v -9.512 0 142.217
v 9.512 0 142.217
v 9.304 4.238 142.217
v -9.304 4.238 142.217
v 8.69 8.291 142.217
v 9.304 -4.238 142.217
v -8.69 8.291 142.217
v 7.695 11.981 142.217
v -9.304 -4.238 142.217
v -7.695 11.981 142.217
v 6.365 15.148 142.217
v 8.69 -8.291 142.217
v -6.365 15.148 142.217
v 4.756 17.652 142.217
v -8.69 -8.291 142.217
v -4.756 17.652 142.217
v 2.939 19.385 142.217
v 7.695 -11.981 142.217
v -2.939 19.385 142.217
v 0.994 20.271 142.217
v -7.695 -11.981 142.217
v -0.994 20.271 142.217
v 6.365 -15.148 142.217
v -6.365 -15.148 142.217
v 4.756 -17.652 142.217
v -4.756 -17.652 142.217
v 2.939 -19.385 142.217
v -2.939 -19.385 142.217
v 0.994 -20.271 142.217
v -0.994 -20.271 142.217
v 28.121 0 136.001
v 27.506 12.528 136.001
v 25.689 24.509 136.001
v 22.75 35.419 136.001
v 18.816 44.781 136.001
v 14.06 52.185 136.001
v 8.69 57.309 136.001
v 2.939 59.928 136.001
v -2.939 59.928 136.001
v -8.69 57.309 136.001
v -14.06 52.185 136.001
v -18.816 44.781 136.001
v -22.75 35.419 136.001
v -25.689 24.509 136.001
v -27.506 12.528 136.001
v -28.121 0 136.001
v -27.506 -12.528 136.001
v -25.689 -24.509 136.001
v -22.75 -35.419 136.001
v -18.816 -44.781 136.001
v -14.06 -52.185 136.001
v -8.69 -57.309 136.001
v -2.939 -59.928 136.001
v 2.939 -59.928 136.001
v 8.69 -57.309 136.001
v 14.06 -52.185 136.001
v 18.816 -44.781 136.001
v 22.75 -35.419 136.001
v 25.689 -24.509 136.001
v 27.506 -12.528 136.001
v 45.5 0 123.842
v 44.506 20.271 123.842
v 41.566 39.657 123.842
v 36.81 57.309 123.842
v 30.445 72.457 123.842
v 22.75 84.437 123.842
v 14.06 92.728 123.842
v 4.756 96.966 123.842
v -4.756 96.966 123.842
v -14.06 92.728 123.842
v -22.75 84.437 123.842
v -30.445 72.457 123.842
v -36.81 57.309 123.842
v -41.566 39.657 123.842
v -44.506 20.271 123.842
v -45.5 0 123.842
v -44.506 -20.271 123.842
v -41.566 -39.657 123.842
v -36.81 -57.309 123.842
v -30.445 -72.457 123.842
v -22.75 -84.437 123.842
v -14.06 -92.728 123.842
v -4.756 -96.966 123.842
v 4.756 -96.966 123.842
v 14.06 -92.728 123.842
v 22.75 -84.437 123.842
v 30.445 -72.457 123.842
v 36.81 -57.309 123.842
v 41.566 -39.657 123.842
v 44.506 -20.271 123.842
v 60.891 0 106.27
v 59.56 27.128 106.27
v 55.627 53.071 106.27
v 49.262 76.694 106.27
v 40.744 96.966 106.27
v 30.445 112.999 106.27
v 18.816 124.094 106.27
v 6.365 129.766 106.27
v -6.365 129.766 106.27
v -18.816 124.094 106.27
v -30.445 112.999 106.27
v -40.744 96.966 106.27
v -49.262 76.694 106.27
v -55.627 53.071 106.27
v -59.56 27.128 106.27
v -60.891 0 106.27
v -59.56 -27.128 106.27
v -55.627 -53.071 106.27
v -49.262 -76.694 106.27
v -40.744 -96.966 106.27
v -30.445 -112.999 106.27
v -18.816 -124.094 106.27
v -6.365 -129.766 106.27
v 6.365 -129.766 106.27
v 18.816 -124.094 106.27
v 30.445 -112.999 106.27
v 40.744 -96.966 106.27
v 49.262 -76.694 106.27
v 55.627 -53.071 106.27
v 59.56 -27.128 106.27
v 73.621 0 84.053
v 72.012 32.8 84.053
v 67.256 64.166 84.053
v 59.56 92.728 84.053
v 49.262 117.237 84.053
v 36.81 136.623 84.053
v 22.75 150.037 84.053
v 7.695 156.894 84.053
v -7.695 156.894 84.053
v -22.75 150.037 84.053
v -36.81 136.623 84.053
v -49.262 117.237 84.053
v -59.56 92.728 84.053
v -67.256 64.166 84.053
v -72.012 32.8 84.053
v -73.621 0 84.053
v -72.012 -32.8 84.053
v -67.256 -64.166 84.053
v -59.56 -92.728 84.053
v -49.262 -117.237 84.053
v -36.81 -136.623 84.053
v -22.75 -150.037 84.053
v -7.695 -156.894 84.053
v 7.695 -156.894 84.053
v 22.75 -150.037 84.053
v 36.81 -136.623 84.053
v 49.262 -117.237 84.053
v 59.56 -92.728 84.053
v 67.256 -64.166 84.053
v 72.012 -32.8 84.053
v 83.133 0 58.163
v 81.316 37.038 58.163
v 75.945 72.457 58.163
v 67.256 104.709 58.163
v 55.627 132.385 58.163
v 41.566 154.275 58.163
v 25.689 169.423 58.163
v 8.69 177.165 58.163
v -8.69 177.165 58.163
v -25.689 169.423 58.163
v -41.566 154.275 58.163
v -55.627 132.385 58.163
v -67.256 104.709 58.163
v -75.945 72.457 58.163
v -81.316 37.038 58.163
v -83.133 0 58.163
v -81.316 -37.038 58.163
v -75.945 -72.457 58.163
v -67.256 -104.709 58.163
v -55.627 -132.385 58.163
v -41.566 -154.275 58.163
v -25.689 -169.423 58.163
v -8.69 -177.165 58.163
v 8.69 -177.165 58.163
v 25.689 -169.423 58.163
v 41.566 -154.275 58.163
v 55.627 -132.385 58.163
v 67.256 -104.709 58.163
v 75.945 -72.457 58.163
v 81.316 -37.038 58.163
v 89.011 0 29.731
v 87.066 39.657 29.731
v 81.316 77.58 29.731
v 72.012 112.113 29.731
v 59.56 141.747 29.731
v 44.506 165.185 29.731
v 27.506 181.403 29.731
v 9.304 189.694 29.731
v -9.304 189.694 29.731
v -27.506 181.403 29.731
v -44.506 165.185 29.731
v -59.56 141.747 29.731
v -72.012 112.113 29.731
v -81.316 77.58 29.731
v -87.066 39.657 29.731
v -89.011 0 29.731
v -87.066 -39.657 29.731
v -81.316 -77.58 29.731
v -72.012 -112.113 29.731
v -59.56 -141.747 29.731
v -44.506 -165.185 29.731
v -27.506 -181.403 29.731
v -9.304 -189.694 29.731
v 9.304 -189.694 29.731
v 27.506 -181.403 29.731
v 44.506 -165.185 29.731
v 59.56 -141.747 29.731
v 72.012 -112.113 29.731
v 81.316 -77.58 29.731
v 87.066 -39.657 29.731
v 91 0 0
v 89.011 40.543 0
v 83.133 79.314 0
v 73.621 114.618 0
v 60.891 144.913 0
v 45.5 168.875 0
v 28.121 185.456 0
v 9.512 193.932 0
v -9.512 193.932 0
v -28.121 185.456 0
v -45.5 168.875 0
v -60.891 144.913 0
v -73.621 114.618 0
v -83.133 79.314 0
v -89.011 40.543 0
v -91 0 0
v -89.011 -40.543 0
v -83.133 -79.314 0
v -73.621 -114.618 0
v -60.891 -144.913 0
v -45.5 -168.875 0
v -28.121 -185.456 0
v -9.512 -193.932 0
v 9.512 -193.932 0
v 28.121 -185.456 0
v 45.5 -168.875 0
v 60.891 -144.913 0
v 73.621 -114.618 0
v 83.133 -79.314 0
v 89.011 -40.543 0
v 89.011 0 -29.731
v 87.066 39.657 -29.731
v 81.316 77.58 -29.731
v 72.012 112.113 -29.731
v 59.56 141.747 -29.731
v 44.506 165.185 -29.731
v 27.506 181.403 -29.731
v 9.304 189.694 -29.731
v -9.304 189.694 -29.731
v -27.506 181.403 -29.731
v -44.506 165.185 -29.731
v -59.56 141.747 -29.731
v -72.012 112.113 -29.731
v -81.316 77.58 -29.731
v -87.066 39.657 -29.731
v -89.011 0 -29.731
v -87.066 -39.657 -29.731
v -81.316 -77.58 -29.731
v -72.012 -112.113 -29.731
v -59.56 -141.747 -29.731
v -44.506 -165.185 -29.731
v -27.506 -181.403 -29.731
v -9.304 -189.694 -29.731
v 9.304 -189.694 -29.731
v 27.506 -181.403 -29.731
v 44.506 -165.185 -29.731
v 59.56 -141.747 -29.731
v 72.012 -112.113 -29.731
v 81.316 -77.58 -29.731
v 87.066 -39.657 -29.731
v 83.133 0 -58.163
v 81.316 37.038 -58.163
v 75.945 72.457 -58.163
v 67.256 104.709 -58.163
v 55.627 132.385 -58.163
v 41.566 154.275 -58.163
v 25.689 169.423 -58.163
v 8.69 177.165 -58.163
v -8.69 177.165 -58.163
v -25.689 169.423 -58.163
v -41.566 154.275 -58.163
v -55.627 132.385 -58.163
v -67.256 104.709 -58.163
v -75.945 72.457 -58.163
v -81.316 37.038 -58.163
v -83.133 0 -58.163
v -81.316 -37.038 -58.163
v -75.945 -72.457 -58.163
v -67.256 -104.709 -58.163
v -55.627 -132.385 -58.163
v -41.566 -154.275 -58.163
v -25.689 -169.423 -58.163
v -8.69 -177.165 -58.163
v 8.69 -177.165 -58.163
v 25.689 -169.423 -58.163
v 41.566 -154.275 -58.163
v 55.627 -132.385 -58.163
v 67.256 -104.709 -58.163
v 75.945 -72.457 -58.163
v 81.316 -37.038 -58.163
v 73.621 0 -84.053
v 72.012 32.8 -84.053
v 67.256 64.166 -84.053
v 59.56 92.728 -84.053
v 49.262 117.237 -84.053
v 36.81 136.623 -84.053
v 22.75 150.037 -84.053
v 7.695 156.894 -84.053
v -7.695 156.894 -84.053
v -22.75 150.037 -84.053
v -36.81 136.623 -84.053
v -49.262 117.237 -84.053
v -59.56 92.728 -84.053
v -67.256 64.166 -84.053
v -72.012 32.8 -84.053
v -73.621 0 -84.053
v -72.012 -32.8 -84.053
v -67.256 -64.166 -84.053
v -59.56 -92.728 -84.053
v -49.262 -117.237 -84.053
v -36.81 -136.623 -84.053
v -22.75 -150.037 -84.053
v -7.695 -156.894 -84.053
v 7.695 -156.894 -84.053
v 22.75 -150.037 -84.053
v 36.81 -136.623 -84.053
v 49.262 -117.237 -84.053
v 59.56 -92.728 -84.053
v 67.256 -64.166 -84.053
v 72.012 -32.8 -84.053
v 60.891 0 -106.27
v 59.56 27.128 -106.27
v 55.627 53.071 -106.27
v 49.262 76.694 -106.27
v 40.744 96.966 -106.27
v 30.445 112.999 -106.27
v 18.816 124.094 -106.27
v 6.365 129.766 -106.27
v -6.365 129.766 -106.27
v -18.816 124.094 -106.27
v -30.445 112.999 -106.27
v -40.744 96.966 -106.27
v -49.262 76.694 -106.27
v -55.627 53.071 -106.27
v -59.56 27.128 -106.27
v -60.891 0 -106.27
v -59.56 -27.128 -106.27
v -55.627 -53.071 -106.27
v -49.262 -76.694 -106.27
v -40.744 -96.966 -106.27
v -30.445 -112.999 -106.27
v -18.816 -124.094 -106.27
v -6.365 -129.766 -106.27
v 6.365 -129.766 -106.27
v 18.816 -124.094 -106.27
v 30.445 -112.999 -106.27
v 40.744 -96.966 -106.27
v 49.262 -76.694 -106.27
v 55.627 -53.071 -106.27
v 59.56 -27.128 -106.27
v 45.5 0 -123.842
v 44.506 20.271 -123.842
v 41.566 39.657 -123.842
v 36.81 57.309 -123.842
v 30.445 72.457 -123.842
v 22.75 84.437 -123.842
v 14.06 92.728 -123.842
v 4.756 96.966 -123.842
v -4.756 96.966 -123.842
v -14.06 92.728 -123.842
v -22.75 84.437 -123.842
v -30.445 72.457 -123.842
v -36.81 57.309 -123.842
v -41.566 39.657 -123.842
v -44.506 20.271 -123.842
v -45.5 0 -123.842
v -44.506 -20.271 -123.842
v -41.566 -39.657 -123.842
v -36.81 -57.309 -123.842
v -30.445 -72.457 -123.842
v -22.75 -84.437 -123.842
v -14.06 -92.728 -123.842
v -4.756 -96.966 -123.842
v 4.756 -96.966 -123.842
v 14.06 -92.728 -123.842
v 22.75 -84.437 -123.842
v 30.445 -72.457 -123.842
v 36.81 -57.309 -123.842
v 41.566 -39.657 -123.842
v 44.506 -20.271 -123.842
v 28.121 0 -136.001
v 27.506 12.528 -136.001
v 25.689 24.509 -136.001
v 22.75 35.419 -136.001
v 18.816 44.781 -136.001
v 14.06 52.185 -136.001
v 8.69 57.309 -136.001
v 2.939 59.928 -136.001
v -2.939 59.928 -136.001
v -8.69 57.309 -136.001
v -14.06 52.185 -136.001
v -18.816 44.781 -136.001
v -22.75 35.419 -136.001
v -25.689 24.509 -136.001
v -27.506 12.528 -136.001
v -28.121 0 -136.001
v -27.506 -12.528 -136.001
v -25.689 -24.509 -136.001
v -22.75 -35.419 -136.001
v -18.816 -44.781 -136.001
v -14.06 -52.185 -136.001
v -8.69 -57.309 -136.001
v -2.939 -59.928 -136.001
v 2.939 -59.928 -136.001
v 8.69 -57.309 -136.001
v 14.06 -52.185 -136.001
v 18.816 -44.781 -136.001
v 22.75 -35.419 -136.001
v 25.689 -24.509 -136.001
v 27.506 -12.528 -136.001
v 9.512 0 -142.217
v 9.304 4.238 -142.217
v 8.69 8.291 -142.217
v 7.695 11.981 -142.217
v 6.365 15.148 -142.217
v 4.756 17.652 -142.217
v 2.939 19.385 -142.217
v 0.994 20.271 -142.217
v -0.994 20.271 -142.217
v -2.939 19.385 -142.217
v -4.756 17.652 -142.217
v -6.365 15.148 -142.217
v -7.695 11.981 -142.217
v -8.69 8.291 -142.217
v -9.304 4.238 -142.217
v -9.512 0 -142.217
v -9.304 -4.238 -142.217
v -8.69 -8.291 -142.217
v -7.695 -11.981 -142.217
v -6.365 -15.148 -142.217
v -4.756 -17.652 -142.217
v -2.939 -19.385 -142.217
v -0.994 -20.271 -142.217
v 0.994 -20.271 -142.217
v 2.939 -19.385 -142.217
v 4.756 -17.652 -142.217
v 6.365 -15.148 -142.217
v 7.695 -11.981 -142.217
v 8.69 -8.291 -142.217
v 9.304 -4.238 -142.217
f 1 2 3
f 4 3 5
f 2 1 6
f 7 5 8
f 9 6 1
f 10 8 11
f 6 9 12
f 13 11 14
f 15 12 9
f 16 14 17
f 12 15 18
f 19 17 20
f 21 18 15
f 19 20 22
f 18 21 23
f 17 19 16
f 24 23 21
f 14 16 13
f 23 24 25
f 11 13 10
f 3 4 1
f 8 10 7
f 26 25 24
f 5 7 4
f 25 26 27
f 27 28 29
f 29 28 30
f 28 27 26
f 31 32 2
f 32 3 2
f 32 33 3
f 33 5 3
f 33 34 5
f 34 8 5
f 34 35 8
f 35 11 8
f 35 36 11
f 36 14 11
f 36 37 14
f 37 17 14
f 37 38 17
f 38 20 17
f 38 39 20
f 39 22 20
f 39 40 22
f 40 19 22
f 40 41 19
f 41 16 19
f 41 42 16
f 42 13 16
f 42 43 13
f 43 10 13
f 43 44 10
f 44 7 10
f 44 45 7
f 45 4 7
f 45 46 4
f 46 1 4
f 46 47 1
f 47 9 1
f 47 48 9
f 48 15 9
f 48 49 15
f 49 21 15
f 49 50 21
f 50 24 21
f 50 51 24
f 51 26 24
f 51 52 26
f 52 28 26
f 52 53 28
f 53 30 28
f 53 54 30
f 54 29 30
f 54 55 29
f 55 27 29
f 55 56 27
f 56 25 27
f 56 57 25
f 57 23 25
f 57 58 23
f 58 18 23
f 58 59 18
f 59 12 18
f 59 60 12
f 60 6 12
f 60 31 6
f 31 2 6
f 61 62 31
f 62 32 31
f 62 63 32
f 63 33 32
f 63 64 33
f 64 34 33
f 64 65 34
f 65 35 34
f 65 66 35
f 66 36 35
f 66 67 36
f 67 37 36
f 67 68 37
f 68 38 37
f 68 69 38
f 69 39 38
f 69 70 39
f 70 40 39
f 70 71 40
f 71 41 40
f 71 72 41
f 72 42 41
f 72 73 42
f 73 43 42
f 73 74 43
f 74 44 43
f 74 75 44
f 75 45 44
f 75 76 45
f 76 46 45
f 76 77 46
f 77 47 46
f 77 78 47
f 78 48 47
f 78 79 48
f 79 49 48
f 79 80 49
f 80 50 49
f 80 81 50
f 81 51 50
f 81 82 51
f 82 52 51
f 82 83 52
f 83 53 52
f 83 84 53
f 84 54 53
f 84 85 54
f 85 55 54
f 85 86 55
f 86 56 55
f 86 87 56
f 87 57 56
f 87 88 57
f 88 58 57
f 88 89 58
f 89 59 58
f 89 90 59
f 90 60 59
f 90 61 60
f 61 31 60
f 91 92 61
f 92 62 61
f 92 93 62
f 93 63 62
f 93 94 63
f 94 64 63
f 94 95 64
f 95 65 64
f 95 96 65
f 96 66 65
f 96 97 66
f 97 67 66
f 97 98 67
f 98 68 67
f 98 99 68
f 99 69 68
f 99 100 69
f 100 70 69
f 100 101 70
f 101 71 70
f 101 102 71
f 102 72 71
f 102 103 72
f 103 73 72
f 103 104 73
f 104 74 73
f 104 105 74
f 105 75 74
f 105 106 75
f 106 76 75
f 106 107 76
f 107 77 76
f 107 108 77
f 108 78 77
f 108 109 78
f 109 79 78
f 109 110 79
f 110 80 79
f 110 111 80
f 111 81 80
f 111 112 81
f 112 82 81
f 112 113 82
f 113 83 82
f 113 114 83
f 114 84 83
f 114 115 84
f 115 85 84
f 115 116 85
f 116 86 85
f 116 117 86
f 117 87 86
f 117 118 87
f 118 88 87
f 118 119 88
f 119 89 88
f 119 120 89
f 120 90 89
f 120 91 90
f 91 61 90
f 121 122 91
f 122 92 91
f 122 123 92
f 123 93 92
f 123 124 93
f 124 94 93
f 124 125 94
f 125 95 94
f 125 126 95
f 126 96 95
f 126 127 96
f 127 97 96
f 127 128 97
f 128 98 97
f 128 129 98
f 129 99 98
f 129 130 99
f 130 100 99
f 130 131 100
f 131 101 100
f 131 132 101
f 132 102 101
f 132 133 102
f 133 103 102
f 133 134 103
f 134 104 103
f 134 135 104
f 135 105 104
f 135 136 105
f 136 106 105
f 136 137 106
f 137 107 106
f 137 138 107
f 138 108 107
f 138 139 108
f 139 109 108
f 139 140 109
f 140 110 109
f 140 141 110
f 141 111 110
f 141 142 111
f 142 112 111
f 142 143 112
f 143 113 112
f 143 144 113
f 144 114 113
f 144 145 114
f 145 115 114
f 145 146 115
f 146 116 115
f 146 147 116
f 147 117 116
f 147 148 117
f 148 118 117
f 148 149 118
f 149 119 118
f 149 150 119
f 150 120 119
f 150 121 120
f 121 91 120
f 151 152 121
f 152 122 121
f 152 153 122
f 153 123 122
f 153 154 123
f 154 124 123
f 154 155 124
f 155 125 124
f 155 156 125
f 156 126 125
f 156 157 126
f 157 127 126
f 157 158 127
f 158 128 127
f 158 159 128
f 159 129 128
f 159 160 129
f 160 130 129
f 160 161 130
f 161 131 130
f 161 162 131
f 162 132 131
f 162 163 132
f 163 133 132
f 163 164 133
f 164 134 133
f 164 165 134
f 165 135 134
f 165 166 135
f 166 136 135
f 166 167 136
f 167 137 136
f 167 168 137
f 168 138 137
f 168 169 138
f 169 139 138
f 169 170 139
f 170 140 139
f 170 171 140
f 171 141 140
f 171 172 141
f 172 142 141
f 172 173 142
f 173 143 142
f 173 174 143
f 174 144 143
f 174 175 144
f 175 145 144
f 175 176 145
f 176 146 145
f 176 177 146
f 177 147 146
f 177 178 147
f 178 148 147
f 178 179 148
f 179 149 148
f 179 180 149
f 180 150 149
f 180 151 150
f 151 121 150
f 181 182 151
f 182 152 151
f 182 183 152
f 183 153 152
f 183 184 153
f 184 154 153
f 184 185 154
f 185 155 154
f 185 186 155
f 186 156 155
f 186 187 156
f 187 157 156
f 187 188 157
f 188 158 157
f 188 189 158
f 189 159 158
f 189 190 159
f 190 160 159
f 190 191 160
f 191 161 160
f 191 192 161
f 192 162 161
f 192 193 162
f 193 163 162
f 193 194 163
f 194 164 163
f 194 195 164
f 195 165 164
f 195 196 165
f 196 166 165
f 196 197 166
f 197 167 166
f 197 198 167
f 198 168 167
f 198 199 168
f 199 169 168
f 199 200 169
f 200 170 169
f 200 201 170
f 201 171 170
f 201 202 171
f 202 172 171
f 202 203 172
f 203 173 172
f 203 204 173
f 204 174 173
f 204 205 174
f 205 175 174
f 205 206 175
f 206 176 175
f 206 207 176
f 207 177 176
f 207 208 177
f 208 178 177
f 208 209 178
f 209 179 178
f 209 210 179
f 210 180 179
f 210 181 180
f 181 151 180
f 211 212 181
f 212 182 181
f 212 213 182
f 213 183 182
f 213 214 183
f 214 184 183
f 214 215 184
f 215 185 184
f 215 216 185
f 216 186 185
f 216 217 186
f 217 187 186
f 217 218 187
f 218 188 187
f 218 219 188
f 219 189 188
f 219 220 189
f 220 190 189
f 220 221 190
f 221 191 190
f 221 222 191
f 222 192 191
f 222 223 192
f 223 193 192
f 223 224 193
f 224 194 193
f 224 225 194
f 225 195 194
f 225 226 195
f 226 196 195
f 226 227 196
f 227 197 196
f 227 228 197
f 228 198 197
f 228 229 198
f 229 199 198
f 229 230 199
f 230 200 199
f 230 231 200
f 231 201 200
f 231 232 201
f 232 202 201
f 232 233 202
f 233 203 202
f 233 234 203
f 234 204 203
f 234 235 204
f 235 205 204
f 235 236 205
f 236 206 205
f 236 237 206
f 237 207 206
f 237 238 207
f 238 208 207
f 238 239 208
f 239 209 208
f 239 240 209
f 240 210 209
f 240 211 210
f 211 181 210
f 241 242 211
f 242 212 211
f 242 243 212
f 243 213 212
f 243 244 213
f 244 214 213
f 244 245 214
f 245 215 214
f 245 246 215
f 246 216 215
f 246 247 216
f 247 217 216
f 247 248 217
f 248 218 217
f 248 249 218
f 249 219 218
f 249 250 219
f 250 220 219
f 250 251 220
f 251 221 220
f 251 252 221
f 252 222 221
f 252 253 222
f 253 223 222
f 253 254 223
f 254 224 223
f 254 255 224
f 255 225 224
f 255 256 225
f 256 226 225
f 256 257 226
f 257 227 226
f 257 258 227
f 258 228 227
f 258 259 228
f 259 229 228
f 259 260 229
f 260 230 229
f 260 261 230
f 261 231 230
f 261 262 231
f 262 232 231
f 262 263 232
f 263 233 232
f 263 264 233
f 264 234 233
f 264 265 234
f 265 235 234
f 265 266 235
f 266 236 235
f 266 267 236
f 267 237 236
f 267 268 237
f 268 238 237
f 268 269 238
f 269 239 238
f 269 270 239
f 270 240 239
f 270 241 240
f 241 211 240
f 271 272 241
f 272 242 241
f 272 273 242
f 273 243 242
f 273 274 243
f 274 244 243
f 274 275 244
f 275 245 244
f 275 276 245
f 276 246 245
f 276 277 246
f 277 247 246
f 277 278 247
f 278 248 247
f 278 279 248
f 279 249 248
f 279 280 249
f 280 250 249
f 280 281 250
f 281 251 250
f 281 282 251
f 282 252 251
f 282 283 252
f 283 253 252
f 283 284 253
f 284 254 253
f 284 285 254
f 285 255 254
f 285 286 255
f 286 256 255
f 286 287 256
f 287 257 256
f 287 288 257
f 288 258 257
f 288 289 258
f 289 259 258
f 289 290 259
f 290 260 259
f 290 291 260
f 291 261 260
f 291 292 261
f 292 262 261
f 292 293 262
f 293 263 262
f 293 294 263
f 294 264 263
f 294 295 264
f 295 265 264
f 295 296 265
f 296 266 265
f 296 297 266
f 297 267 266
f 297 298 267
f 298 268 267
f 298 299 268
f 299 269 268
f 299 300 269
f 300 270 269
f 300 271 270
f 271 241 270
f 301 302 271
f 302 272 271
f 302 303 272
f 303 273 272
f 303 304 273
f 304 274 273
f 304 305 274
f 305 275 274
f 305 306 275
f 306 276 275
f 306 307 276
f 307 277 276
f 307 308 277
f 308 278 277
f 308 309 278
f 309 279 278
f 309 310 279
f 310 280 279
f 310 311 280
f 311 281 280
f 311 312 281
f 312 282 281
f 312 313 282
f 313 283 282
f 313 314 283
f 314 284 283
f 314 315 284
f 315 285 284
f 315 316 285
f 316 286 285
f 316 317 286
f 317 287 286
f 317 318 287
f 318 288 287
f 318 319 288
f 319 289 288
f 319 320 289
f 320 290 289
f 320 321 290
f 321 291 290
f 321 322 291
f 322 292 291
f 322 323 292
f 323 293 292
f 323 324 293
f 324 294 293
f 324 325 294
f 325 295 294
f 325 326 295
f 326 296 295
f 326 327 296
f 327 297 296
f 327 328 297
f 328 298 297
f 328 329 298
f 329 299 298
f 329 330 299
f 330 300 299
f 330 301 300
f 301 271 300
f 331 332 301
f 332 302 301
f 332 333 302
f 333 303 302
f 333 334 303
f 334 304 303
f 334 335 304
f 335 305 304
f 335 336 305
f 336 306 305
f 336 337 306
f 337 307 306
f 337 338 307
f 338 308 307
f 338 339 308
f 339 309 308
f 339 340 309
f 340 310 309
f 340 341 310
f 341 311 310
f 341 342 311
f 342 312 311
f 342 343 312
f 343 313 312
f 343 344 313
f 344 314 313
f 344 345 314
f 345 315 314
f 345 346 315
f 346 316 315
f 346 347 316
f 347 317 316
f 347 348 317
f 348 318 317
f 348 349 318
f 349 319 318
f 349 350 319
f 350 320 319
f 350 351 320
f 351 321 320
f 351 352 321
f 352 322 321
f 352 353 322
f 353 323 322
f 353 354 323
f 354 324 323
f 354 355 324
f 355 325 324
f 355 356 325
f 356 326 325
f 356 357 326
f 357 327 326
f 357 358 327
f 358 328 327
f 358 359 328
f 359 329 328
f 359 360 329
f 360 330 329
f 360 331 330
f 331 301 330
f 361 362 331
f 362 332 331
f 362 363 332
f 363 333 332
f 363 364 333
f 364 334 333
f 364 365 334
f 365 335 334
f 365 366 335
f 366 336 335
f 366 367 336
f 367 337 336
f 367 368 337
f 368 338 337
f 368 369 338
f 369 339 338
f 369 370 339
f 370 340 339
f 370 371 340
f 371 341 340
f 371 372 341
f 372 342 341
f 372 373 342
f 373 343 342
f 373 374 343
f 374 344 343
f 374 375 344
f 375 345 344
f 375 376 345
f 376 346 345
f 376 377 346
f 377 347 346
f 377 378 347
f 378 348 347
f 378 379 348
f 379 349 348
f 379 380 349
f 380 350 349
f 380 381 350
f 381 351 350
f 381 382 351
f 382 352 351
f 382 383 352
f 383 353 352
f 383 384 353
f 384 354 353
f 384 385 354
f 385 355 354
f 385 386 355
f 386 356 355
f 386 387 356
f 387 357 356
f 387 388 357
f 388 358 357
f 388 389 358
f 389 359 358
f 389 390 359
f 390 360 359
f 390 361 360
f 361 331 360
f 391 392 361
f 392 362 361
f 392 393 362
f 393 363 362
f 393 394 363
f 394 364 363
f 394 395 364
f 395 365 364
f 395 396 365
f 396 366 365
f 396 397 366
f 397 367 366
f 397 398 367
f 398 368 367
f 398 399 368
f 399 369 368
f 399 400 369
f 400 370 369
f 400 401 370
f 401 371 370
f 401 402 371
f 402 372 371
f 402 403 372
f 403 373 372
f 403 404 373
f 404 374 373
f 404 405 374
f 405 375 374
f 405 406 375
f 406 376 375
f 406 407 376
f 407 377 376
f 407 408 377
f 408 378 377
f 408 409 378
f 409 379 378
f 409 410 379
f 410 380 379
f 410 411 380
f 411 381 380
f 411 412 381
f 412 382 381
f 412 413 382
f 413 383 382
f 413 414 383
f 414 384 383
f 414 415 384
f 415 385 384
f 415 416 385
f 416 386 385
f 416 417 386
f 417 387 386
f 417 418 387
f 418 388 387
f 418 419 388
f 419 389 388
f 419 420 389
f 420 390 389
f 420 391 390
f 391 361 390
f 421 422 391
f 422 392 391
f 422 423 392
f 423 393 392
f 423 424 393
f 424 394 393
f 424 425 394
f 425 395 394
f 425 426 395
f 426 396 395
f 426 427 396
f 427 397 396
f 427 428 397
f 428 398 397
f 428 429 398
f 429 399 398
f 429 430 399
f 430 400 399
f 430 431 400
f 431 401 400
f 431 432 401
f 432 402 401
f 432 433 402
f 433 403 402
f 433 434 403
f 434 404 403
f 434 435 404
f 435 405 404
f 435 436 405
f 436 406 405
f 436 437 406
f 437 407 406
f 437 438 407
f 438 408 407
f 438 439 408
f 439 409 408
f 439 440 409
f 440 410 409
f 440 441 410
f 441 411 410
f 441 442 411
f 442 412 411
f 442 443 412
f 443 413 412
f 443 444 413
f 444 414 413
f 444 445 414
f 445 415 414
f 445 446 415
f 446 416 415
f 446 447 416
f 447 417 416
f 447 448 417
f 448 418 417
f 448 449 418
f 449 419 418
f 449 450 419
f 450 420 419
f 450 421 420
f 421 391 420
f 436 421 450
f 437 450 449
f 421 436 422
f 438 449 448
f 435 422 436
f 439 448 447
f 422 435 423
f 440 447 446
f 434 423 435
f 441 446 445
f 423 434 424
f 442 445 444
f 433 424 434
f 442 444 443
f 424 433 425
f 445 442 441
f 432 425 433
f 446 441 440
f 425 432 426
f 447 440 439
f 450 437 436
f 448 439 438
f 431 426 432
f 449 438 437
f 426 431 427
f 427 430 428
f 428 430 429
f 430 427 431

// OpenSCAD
// Generated by SolidPython 1.0.1 on 2020-07-29 00:46:48


scale(v = [7, 15, 11]) {
	sphere(r = 13);
}
/***********************************************
*********      SolidPython code:      **********
************************************************
 
# import packages: SolidPython
from solid import *
from solid.utils import *
from itertools import chain, combinations, permutations


class Resize:

    def __init__(self, scad_file):
        self.scad_file = scad_file
        #self.scad_file = import_scad(scad_file)
        # cone/cylinder param:
        self.r1 = 0
        self.r2 = 0
        self.h = 0
        # rectangular prism param:
        self.w = 0
        self.l = 0
        # ellipse param:
        self.r = 0

    # import OpenScad code (file name corresponds to shape)


    # classify shape + parameters
    def assign(self, param1, param2, param3):
        if self.scad_file == 'cone.scad':
            self.r1 = param1
            self.r2 = param2
            self.h = param3
        elif self.scad_file == 'cylinder.scad':
            self.r1 = param1
            self.r2 = param2
            self.h = param3
        elif self.scad_file == 'rectangularPrism.scad':
            self.h = param1
            self.l = param2
            self.w = param3
        else:
            self.r = param1
            self.h = param2

    # resize parameters
    def iterate(self):
        x = range(3, 20, 2)
        i = 1
        if self.scad_file == 'cone.scad':
            tempList = list(permutations(x, 2))
            for temp in tempList:
                param1 = temp[0]
                param2 = temp[1]
                filepath = 'produced_scad_files/' + 'cone' + str(param1) + '_' + str(param2) + '_' + '.scad'
                scad_render_to_file(cylinder(h=param1, r1=param2, r2=0), filepath)

        elif self.scad_file == 'cylinder.scad':
            tempList = list(permutations(x, 3))
            for temp in tempList:
                param1 = temp[0]
                param2 = temp[1]
                filepath = 'produced_scad_files/' + 'cylinder' + str(param1) + '_' + str(param2) + '_' + '.scad'
                scad_render_to_file(cylinder(h=param1, r1=param2, r2=param2), filepath)

        elif self.scad_file == 'rectangularPrism.scad':
            tempList = list(permutations(x, 3))
            for temp in tempList:
                param1 = temp[0]
                param2 = temp[1]
                param3 = temp[2]
                filepath = 'produced_scad_files/' + 'rectangularPrism' + str(param1) + '_' + str(param2) + '_' + str(
                    param3) + '.scad'
                scad_render_to_file(cube(size=(param1, param2, param3)), filepath)

        elif self.scad_file == 'ellipse.scad':
            tempList = list(permutations(x, 4))
            for temp in tempList:
                param1 = temp[0]
                param2 = temp[1]
                param3 = temp[2]
                param4 = temp[3]
                filepath = 'produced_scad_files/' + 'ellipse' + str(param1) + '_' + str(param2) + '_' + str(param3) + '_' + str(param4) + '.scad'
                scad_render_to_file(scale([param1, param2, param3])(sphere(r=param4)), filepath)

    def render_to_scadfile(self):
        scad_render_to_file(scad, 'example.scad') 
 
************************************************/
